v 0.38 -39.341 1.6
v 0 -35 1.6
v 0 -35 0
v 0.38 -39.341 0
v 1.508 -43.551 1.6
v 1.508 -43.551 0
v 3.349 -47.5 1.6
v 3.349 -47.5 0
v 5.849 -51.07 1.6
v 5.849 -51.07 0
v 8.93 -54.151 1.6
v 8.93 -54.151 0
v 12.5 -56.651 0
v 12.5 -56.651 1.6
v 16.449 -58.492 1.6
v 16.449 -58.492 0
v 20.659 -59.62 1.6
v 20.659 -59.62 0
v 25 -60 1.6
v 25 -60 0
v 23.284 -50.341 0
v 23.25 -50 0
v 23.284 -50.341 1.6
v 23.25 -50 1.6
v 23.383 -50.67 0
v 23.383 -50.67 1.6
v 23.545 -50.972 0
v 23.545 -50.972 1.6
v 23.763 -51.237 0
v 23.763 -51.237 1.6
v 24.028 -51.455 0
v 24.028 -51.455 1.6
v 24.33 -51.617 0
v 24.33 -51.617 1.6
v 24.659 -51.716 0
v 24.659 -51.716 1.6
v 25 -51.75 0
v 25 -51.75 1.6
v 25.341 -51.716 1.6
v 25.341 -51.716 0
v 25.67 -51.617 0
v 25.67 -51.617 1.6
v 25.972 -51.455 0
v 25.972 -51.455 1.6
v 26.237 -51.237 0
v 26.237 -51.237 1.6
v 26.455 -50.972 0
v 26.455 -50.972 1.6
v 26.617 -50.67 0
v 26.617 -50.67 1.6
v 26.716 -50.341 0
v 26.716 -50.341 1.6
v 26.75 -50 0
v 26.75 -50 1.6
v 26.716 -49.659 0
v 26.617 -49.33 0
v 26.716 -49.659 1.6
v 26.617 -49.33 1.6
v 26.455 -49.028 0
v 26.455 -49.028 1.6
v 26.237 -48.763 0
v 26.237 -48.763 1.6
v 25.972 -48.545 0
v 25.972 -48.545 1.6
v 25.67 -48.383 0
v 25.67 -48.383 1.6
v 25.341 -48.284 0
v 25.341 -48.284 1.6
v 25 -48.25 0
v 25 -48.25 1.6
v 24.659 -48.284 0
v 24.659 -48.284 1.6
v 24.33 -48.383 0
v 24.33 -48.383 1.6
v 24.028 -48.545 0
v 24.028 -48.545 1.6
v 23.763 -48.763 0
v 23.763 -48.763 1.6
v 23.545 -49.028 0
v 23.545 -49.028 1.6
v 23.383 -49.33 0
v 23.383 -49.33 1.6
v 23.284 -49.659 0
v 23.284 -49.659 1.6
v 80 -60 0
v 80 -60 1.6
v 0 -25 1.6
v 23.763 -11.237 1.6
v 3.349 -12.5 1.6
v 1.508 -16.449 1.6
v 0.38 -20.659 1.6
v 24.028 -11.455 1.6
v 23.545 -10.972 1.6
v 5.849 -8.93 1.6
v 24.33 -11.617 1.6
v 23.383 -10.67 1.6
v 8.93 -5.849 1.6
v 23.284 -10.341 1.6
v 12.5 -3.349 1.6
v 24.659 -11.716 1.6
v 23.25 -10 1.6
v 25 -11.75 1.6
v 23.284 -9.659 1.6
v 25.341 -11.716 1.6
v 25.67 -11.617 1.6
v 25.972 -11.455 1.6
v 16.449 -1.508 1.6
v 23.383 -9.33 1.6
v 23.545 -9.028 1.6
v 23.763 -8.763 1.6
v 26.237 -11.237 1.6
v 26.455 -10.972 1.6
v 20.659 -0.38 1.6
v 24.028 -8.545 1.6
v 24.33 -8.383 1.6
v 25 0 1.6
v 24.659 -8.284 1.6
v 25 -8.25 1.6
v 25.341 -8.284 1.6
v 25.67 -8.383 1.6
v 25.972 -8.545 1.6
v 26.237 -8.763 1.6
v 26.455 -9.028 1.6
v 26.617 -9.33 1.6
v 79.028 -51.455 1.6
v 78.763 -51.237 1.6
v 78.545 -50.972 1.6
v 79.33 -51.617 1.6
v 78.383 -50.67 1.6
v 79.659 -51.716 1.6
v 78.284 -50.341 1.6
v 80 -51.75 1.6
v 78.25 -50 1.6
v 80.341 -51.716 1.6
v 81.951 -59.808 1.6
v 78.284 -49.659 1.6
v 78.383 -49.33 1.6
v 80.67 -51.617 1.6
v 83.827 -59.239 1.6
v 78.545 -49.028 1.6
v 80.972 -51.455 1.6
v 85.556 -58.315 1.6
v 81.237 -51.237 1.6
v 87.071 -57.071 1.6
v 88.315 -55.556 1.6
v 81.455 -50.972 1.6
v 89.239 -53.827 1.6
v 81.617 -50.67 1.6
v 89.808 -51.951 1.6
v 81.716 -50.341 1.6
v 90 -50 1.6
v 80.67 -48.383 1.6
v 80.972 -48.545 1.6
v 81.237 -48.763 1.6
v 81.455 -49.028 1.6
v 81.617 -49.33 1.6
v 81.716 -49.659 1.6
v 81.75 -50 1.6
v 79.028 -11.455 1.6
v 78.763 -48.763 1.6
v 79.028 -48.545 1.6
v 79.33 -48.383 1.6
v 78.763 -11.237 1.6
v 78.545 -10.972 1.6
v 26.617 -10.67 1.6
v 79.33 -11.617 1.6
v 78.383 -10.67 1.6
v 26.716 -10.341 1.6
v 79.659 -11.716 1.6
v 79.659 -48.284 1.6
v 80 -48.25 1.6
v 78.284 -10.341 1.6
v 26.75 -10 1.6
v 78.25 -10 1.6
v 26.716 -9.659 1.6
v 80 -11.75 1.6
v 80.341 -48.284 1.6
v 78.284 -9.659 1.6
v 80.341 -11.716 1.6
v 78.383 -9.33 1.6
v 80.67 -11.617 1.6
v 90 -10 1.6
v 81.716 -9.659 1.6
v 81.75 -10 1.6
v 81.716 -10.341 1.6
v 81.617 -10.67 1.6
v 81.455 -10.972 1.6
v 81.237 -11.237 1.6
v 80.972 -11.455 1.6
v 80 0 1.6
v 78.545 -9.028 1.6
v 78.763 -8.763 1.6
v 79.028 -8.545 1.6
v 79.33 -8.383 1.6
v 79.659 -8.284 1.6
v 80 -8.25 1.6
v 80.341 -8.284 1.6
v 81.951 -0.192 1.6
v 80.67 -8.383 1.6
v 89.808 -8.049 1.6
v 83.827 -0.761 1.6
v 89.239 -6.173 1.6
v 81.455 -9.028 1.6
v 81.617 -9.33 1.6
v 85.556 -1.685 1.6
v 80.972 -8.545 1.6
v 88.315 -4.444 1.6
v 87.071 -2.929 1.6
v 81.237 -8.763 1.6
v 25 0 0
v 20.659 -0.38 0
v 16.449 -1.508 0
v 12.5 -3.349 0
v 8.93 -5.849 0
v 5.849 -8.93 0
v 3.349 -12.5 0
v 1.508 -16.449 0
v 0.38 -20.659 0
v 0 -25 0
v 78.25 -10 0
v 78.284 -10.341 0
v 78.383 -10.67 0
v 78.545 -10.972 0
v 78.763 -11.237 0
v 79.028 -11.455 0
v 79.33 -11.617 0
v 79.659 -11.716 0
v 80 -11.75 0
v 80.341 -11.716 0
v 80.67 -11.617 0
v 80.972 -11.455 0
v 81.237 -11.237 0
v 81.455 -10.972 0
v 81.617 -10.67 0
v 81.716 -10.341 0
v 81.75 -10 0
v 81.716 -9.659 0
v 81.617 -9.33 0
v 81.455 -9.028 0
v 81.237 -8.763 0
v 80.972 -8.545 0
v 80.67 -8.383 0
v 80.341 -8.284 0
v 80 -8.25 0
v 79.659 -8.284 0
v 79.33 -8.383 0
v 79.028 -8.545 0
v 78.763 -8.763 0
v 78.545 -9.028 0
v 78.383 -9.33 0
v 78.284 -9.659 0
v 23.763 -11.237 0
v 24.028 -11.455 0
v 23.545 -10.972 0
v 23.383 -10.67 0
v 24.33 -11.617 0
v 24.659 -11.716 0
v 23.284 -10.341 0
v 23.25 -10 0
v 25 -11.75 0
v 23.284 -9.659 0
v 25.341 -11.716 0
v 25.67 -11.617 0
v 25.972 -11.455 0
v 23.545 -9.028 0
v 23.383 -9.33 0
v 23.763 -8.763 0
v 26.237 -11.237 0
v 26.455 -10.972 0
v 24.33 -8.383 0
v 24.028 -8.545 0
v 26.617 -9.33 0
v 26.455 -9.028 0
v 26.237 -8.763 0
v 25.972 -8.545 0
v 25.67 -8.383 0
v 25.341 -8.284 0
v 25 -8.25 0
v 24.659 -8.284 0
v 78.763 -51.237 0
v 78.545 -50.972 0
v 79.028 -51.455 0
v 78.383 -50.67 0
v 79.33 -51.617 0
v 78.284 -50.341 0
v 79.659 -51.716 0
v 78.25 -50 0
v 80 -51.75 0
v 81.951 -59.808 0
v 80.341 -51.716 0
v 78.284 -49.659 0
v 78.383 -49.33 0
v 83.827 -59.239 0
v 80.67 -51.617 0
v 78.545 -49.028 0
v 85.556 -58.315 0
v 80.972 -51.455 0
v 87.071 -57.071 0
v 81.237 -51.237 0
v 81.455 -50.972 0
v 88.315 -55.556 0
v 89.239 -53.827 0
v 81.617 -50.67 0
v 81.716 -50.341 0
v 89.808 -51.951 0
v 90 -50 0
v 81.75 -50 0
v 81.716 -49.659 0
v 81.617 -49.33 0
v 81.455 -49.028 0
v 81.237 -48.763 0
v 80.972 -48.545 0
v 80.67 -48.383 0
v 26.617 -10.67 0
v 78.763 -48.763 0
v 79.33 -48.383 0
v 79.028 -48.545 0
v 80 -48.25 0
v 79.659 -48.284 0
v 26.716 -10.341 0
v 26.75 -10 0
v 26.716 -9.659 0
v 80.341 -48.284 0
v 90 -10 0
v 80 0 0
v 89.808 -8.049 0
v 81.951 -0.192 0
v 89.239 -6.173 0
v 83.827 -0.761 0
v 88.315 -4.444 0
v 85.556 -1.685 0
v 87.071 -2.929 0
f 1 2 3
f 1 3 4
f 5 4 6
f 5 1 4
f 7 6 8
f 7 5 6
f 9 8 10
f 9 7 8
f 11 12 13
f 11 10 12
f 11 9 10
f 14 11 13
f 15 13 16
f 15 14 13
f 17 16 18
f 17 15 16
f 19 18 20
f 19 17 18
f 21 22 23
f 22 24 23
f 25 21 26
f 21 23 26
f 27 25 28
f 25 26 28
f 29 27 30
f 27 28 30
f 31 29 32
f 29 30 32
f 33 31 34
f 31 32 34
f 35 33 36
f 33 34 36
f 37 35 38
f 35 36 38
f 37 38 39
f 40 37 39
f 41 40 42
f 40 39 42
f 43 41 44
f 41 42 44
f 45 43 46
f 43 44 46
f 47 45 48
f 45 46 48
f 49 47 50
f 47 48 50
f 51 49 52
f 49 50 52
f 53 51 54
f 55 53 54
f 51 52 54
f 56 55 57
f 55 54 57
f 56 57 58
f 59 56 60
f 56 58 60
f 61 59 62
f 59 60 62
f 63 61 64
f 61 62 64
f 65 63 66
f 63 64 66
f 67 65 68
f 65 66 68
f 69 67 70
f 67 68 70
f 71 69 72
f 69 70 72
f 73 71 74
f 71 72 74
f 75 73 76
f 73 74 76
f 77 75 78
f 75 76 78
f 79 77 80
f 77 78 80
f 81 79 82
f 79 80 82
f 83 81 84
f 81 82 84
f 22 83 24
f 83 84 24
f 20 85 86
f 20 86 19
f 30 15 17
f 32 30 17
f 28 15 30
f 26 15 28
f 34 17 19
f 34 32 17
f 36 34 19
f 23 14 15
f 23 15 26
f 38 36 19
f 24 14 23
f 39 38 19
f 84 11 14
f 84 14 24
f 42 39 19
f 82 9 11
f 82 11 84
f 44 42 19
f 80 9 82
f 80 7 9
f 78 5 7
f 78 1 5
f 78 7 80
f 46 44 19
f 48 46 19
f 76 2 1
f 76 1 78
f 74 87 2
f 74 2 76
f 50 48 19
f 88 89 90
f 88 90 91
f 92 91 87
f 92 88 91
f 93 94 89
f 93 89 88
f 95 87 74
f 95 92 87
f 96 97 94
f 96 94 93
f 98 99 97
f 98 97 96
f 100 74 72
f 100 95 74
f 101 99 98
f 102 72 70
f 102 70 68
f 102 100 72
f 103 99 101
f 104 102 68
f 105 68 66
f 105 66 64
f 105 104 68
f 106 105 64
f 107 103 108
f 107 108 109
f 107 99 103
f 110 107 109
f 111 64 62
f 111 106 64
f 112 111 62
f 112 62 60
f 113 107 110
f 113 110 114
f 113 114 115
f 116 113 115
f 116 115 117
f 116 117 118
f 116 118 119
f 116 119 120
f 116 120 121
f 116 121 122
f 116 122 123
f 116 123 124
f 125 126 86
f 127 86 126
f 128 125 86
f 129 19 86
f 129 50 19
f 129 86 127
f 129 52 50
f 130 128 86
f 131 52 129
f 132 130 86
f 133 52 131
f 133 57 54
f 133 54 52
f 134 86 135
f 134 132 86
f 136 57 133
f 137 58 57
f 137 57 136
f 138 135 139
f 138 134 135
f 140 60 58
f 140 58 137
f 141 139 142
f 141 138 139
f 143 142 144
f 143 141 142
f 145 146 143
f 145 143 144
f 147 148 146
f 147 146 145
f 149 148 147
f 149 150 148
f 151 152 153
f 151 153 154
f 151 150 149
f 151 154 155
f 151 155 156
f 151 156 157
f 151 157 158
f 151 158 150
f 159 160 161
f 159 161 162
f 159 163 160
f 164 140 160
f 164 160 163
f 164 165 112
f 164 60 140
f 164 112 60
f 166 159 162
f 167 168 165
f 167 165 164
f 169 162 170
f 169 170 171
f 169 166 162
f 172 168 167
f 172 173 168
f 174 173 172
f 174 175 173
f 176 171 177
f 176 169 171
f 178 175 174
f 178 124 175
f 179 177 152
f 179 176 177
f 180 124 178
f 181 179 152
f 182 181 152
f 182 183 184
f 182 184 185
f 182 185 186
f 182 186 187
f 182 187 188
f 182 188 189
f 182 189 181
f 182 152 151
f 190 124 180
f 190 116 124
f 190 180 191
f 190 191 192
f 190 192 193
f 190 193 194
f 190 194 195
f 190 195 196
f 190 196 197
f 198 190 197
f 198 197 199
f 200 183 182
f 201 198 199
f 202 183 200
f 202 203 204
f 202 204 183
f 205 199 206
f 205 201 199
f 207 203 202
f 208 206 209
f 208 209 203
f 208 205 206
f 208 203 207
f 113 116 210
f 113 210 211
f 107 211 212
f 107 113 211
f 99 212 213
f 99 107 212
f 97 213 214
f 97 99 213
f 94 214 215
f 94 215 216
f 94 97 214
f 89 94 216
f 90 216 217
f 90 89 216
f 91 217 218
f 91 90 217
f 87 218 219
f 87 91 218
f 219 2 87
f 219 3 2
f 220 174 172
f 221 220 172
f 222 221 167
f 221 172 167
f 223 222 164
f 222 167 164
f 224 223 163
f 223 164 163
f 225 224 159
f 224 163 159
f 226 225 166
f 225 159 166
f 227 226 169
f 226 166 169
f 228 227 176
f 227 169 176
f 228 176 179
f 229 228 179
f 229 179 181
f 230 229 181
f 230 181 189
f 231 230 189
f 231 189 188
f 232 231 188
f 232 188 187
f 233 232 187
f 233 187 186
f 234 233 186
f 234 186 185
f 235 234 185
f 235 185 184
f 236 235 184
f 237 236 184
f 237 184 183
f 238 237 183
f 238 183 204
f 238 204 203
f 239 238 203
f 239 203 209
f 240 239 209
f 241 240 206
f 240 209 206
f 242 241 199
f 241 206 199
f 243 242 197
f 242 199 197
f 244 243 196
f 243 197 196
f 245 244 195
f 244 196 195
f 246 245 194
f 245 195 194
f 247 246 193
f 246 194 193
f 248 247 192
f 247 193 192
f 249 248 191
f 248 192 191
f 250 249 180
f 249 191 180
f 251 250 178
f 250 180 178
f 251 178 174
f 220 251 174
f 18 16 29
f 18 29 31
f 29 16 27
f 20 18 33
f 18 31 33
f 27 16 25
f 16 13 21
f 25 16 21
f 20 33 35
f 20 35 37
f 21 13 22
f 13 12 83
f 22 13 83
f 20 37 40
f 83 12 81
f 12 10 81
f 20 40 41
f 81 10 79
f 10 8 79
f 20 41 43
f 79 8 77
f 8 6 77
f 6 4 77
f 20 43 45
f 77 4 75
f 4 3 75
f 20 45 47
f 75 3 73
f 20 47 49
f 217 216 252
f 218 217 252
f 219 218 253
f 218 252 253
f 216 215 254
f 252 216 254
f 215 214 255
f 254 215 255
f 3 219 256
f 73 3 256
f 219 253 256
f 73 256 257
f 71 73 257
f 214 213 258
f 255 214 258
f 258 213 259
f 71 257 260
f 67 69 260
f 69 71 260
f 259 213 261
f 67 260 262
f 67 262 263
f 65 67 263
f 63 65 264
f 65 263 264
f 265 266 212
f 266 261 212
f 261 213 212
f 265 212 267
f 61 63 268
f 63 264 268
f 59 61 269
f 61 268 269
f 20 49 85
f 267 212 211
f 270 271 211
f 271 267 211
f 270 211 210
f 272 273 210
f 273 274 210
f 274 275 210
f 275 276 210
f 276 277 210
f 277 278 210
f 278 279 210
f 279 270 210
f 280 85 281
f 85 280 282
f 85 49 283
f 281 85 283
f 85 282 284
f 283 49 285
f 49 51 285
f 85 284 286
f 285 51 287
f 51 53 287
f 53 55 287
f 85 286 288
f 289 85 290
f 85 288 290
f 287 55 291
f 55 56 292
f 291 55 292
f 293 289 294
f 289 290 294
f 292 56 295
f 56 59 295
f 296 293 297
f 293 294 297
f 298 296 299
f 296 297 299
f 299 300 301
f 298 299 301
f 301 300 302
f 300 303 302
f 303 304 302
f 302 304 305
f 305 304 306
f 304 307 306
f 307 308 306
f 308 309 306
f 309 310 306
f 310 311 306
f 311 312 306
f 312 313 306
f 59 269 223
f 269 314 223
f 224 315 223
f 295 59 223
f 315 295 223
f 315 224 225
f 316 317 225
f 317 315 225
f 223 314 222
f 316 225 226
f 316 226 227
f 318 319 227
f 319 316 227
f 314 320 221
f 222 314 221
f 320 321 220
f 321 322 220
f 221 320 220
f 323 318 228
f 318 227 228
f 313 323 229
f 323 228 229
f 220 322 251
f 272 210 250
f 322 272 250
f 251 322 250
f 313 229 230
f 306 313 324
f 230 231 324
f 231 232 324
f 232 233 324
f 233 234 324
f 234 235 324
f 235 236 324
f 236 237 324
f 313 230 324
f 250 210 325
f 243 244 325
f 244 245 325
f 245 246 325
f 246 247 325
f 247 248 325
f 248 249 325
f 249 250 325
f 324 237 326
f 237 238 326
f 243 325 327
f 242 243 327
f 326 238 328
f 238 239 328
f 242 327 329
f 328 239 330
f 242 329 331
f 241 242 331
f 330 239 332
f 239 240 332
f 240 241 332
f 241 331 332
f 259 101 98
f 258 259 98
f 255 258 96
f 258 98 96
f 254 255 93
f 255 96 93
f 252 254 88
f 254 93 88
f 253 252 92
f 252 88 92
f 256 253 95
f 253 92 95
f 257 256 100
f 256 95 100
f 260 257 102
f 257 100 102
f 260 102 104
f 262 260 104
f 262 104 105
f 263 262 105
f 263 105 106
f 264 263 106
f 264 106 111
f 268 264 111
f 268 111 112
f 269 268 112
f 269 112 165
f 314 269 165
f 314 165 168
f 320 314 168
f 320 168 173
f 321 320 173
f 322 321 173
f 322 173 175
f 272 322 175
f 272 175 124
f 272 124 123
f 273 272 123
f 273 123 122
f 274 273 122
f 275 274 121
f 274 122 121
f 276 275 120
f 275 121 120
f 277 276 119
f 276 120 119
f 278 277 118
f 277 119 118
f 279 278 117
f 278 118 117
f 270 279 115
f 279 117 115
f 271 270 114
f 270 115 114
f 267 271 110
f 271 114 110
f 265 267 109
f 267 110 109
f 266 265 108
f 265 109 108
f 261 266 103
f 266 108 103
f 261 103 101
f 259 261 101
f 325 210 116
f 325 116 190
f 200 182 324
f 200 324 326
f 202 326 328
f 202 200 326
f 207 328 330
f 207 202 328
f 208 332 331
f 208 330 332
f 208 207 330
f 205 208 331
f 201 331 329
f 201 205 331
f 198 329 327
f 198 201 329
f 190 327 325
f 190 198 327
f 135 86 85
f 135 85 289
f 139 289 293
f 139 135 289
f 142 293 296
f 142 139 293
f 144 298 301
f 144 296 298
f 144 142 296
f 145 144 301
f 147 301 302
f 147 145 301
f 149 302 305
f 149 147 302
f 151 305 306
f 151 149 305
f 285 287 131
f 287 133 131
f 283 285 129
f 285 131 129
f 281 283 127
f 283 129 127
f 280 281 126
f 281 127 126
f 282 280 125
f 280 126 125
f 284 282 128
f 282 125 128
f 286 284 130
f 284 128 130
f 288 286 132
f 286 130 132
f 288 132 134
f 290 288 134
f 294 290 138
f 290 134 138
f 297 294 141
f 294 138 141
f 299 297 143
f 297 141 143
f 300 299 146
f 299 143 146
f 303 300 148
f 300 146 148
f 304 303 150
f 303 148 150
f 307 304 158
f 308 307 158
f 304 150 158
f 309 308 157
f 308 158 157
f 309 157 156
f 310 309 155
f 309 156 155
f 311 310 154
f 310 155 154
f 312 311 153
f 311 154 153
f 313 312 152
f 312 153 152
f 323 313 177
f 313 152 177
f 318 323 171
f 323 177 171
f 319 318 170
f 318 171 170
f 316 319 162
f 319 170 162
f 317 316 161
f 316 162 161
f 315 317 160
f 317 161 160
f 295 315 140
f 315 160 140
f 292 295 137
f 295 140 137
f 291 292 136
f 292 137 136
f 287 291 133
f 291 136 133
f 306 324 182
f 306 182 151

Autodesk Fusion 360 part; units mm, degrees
sketch "Sketch4" plane through (0, 0, 0) normal (0, 0, 1) x (1, 0, 0)
  line L0 (0, 0) -> (90, 0)
  line L1 (90, 0) -> (90, -60)
  line L2 (90, -60) -> (0, -60)
  line L3 (0, -60) -> (0, 0)
  dimension "d13" = 90
  dimension "d14" = 60
extrude "Extrude3" add sketch "Sketch4" along normal blind 1.6
fillet "Fillet1" radius 25 2 edges at (0, -60, 0.8) (0, 0, 0.8)
fillet "Fillet2" radius 10 2 edges at (90, -60, 0.8) (90, 0, 0.8)
sketch "Sketch5" plane through (0, 0, 1.6) normal (0, 0, 1) x (-1, 0, 0)
  arc A0 (-90, 10) -> (-80, 0) centre (-80, 10) ccw
  line L0 (-80, 0) -> (-25, 0)
  arc A1 (-25, 0) -> (0, 25) centre (-25, 25) ccw
  line L1 (0, 25) -> (0, 35)
  arc A2 (0, 35) -> (-25, 60) centre (-25, 35) ccw
  line L2 (-25, 60) -> (-80, 60)
  arc A3 (-80, 60) -> (-90, 50) centre (-80, 50) ccw
  line L3 (-90, 50) -> (-90, 10)
  line L4 (-80, 10) -> (-25, 10)
  line L5 (-25, 10) -> (-25, 50)
  line L6 (-25, 50) -> (-80, 50)
  line L7 (-80, 50) -> (-80, 10)
  circle A4 centre (-80, 10) radius 1.75
  circle A5 centre (-25, 10) radius 1.75
  circle A6 centre (-25, 50) radius 1.75
  circle A7 centre (-80, 50) radius 1.75
  dimension "d21" = 3.5
  dimension "d22" = 3.5
  dimension "d23" = 3.5
  dimension "d24" = 3.5
extrude "Extrude4" cut sketch "Sketch5" against normal blind 2 contours L4 L7 A4 | L4 L7 A4 | L4 L5 A5 | L4 L5 A5 | L6 L7 A7 | L6 L7 A7 | L5 L6 A6 | L5 L6 A6
sketch "Sketch6" plane through (0, 0, 1.6) normal (0, 0, 1) x (-1, 0, 0)
  circle A0 centre (-80, 10) radius 1.75
  circle A1 centre (-80, 50) radius 1.75
  circle A2 centre (-25, 10) radius 1.75
  circle A3 centre (-25, 50) radius 1.75
  arc A4 (-90, 10) -> (-80, 0) centre (-80, 10) ccw
  line L0 (-80, 0) -> (-25, 0)
  arc A5 (-25, 0) -> (0, 25) centre (-25, 25) ccw
  line L1 (0, 25) -> (0, 35)
  arc A6 (0, 35) -> (-25, 60) centre (-25, 35) ccw
  line L2 (-25, 60) -> (-80, 60)
  arc A7 (-80, 60) -> (-90, 50) centre (-80, 50) ccw
  line L3 (-90, 50) -> (-90, 10)
sketch "Sketch7" plane through (0, 0, 1.6) normal (0, 0, 1) x (-1, 0, 0)
  circle A0 centre (-80, 10) radius 1.75
  circle A1 centre (-80, 50) radius 1.75
  circle A2 centre (-25, 10) radius 1.75
  circle A3 centre (-25, 50) radius 1.75
  arc A4 (-90, 10) -> (-80, 0) centre (-80, 10) ccw
  line L0 (-80, 0) -> (-25, 0)
  arc A5 (-25, 0) -> (0, 25) centre (-25, 25) ccw
  line L1 (0, 25) -> (0, 35)
  arc A6 (0, 35) -> (-25, 60) centre (-25, 35) ccw
  line L2 (-25, 60) -> (-80, 60)
  arc A7 (-80, 60) -> (-90, 50) centre (-80, 50) ccw
  line L3 (-90, 50) -> (-90, 10)
